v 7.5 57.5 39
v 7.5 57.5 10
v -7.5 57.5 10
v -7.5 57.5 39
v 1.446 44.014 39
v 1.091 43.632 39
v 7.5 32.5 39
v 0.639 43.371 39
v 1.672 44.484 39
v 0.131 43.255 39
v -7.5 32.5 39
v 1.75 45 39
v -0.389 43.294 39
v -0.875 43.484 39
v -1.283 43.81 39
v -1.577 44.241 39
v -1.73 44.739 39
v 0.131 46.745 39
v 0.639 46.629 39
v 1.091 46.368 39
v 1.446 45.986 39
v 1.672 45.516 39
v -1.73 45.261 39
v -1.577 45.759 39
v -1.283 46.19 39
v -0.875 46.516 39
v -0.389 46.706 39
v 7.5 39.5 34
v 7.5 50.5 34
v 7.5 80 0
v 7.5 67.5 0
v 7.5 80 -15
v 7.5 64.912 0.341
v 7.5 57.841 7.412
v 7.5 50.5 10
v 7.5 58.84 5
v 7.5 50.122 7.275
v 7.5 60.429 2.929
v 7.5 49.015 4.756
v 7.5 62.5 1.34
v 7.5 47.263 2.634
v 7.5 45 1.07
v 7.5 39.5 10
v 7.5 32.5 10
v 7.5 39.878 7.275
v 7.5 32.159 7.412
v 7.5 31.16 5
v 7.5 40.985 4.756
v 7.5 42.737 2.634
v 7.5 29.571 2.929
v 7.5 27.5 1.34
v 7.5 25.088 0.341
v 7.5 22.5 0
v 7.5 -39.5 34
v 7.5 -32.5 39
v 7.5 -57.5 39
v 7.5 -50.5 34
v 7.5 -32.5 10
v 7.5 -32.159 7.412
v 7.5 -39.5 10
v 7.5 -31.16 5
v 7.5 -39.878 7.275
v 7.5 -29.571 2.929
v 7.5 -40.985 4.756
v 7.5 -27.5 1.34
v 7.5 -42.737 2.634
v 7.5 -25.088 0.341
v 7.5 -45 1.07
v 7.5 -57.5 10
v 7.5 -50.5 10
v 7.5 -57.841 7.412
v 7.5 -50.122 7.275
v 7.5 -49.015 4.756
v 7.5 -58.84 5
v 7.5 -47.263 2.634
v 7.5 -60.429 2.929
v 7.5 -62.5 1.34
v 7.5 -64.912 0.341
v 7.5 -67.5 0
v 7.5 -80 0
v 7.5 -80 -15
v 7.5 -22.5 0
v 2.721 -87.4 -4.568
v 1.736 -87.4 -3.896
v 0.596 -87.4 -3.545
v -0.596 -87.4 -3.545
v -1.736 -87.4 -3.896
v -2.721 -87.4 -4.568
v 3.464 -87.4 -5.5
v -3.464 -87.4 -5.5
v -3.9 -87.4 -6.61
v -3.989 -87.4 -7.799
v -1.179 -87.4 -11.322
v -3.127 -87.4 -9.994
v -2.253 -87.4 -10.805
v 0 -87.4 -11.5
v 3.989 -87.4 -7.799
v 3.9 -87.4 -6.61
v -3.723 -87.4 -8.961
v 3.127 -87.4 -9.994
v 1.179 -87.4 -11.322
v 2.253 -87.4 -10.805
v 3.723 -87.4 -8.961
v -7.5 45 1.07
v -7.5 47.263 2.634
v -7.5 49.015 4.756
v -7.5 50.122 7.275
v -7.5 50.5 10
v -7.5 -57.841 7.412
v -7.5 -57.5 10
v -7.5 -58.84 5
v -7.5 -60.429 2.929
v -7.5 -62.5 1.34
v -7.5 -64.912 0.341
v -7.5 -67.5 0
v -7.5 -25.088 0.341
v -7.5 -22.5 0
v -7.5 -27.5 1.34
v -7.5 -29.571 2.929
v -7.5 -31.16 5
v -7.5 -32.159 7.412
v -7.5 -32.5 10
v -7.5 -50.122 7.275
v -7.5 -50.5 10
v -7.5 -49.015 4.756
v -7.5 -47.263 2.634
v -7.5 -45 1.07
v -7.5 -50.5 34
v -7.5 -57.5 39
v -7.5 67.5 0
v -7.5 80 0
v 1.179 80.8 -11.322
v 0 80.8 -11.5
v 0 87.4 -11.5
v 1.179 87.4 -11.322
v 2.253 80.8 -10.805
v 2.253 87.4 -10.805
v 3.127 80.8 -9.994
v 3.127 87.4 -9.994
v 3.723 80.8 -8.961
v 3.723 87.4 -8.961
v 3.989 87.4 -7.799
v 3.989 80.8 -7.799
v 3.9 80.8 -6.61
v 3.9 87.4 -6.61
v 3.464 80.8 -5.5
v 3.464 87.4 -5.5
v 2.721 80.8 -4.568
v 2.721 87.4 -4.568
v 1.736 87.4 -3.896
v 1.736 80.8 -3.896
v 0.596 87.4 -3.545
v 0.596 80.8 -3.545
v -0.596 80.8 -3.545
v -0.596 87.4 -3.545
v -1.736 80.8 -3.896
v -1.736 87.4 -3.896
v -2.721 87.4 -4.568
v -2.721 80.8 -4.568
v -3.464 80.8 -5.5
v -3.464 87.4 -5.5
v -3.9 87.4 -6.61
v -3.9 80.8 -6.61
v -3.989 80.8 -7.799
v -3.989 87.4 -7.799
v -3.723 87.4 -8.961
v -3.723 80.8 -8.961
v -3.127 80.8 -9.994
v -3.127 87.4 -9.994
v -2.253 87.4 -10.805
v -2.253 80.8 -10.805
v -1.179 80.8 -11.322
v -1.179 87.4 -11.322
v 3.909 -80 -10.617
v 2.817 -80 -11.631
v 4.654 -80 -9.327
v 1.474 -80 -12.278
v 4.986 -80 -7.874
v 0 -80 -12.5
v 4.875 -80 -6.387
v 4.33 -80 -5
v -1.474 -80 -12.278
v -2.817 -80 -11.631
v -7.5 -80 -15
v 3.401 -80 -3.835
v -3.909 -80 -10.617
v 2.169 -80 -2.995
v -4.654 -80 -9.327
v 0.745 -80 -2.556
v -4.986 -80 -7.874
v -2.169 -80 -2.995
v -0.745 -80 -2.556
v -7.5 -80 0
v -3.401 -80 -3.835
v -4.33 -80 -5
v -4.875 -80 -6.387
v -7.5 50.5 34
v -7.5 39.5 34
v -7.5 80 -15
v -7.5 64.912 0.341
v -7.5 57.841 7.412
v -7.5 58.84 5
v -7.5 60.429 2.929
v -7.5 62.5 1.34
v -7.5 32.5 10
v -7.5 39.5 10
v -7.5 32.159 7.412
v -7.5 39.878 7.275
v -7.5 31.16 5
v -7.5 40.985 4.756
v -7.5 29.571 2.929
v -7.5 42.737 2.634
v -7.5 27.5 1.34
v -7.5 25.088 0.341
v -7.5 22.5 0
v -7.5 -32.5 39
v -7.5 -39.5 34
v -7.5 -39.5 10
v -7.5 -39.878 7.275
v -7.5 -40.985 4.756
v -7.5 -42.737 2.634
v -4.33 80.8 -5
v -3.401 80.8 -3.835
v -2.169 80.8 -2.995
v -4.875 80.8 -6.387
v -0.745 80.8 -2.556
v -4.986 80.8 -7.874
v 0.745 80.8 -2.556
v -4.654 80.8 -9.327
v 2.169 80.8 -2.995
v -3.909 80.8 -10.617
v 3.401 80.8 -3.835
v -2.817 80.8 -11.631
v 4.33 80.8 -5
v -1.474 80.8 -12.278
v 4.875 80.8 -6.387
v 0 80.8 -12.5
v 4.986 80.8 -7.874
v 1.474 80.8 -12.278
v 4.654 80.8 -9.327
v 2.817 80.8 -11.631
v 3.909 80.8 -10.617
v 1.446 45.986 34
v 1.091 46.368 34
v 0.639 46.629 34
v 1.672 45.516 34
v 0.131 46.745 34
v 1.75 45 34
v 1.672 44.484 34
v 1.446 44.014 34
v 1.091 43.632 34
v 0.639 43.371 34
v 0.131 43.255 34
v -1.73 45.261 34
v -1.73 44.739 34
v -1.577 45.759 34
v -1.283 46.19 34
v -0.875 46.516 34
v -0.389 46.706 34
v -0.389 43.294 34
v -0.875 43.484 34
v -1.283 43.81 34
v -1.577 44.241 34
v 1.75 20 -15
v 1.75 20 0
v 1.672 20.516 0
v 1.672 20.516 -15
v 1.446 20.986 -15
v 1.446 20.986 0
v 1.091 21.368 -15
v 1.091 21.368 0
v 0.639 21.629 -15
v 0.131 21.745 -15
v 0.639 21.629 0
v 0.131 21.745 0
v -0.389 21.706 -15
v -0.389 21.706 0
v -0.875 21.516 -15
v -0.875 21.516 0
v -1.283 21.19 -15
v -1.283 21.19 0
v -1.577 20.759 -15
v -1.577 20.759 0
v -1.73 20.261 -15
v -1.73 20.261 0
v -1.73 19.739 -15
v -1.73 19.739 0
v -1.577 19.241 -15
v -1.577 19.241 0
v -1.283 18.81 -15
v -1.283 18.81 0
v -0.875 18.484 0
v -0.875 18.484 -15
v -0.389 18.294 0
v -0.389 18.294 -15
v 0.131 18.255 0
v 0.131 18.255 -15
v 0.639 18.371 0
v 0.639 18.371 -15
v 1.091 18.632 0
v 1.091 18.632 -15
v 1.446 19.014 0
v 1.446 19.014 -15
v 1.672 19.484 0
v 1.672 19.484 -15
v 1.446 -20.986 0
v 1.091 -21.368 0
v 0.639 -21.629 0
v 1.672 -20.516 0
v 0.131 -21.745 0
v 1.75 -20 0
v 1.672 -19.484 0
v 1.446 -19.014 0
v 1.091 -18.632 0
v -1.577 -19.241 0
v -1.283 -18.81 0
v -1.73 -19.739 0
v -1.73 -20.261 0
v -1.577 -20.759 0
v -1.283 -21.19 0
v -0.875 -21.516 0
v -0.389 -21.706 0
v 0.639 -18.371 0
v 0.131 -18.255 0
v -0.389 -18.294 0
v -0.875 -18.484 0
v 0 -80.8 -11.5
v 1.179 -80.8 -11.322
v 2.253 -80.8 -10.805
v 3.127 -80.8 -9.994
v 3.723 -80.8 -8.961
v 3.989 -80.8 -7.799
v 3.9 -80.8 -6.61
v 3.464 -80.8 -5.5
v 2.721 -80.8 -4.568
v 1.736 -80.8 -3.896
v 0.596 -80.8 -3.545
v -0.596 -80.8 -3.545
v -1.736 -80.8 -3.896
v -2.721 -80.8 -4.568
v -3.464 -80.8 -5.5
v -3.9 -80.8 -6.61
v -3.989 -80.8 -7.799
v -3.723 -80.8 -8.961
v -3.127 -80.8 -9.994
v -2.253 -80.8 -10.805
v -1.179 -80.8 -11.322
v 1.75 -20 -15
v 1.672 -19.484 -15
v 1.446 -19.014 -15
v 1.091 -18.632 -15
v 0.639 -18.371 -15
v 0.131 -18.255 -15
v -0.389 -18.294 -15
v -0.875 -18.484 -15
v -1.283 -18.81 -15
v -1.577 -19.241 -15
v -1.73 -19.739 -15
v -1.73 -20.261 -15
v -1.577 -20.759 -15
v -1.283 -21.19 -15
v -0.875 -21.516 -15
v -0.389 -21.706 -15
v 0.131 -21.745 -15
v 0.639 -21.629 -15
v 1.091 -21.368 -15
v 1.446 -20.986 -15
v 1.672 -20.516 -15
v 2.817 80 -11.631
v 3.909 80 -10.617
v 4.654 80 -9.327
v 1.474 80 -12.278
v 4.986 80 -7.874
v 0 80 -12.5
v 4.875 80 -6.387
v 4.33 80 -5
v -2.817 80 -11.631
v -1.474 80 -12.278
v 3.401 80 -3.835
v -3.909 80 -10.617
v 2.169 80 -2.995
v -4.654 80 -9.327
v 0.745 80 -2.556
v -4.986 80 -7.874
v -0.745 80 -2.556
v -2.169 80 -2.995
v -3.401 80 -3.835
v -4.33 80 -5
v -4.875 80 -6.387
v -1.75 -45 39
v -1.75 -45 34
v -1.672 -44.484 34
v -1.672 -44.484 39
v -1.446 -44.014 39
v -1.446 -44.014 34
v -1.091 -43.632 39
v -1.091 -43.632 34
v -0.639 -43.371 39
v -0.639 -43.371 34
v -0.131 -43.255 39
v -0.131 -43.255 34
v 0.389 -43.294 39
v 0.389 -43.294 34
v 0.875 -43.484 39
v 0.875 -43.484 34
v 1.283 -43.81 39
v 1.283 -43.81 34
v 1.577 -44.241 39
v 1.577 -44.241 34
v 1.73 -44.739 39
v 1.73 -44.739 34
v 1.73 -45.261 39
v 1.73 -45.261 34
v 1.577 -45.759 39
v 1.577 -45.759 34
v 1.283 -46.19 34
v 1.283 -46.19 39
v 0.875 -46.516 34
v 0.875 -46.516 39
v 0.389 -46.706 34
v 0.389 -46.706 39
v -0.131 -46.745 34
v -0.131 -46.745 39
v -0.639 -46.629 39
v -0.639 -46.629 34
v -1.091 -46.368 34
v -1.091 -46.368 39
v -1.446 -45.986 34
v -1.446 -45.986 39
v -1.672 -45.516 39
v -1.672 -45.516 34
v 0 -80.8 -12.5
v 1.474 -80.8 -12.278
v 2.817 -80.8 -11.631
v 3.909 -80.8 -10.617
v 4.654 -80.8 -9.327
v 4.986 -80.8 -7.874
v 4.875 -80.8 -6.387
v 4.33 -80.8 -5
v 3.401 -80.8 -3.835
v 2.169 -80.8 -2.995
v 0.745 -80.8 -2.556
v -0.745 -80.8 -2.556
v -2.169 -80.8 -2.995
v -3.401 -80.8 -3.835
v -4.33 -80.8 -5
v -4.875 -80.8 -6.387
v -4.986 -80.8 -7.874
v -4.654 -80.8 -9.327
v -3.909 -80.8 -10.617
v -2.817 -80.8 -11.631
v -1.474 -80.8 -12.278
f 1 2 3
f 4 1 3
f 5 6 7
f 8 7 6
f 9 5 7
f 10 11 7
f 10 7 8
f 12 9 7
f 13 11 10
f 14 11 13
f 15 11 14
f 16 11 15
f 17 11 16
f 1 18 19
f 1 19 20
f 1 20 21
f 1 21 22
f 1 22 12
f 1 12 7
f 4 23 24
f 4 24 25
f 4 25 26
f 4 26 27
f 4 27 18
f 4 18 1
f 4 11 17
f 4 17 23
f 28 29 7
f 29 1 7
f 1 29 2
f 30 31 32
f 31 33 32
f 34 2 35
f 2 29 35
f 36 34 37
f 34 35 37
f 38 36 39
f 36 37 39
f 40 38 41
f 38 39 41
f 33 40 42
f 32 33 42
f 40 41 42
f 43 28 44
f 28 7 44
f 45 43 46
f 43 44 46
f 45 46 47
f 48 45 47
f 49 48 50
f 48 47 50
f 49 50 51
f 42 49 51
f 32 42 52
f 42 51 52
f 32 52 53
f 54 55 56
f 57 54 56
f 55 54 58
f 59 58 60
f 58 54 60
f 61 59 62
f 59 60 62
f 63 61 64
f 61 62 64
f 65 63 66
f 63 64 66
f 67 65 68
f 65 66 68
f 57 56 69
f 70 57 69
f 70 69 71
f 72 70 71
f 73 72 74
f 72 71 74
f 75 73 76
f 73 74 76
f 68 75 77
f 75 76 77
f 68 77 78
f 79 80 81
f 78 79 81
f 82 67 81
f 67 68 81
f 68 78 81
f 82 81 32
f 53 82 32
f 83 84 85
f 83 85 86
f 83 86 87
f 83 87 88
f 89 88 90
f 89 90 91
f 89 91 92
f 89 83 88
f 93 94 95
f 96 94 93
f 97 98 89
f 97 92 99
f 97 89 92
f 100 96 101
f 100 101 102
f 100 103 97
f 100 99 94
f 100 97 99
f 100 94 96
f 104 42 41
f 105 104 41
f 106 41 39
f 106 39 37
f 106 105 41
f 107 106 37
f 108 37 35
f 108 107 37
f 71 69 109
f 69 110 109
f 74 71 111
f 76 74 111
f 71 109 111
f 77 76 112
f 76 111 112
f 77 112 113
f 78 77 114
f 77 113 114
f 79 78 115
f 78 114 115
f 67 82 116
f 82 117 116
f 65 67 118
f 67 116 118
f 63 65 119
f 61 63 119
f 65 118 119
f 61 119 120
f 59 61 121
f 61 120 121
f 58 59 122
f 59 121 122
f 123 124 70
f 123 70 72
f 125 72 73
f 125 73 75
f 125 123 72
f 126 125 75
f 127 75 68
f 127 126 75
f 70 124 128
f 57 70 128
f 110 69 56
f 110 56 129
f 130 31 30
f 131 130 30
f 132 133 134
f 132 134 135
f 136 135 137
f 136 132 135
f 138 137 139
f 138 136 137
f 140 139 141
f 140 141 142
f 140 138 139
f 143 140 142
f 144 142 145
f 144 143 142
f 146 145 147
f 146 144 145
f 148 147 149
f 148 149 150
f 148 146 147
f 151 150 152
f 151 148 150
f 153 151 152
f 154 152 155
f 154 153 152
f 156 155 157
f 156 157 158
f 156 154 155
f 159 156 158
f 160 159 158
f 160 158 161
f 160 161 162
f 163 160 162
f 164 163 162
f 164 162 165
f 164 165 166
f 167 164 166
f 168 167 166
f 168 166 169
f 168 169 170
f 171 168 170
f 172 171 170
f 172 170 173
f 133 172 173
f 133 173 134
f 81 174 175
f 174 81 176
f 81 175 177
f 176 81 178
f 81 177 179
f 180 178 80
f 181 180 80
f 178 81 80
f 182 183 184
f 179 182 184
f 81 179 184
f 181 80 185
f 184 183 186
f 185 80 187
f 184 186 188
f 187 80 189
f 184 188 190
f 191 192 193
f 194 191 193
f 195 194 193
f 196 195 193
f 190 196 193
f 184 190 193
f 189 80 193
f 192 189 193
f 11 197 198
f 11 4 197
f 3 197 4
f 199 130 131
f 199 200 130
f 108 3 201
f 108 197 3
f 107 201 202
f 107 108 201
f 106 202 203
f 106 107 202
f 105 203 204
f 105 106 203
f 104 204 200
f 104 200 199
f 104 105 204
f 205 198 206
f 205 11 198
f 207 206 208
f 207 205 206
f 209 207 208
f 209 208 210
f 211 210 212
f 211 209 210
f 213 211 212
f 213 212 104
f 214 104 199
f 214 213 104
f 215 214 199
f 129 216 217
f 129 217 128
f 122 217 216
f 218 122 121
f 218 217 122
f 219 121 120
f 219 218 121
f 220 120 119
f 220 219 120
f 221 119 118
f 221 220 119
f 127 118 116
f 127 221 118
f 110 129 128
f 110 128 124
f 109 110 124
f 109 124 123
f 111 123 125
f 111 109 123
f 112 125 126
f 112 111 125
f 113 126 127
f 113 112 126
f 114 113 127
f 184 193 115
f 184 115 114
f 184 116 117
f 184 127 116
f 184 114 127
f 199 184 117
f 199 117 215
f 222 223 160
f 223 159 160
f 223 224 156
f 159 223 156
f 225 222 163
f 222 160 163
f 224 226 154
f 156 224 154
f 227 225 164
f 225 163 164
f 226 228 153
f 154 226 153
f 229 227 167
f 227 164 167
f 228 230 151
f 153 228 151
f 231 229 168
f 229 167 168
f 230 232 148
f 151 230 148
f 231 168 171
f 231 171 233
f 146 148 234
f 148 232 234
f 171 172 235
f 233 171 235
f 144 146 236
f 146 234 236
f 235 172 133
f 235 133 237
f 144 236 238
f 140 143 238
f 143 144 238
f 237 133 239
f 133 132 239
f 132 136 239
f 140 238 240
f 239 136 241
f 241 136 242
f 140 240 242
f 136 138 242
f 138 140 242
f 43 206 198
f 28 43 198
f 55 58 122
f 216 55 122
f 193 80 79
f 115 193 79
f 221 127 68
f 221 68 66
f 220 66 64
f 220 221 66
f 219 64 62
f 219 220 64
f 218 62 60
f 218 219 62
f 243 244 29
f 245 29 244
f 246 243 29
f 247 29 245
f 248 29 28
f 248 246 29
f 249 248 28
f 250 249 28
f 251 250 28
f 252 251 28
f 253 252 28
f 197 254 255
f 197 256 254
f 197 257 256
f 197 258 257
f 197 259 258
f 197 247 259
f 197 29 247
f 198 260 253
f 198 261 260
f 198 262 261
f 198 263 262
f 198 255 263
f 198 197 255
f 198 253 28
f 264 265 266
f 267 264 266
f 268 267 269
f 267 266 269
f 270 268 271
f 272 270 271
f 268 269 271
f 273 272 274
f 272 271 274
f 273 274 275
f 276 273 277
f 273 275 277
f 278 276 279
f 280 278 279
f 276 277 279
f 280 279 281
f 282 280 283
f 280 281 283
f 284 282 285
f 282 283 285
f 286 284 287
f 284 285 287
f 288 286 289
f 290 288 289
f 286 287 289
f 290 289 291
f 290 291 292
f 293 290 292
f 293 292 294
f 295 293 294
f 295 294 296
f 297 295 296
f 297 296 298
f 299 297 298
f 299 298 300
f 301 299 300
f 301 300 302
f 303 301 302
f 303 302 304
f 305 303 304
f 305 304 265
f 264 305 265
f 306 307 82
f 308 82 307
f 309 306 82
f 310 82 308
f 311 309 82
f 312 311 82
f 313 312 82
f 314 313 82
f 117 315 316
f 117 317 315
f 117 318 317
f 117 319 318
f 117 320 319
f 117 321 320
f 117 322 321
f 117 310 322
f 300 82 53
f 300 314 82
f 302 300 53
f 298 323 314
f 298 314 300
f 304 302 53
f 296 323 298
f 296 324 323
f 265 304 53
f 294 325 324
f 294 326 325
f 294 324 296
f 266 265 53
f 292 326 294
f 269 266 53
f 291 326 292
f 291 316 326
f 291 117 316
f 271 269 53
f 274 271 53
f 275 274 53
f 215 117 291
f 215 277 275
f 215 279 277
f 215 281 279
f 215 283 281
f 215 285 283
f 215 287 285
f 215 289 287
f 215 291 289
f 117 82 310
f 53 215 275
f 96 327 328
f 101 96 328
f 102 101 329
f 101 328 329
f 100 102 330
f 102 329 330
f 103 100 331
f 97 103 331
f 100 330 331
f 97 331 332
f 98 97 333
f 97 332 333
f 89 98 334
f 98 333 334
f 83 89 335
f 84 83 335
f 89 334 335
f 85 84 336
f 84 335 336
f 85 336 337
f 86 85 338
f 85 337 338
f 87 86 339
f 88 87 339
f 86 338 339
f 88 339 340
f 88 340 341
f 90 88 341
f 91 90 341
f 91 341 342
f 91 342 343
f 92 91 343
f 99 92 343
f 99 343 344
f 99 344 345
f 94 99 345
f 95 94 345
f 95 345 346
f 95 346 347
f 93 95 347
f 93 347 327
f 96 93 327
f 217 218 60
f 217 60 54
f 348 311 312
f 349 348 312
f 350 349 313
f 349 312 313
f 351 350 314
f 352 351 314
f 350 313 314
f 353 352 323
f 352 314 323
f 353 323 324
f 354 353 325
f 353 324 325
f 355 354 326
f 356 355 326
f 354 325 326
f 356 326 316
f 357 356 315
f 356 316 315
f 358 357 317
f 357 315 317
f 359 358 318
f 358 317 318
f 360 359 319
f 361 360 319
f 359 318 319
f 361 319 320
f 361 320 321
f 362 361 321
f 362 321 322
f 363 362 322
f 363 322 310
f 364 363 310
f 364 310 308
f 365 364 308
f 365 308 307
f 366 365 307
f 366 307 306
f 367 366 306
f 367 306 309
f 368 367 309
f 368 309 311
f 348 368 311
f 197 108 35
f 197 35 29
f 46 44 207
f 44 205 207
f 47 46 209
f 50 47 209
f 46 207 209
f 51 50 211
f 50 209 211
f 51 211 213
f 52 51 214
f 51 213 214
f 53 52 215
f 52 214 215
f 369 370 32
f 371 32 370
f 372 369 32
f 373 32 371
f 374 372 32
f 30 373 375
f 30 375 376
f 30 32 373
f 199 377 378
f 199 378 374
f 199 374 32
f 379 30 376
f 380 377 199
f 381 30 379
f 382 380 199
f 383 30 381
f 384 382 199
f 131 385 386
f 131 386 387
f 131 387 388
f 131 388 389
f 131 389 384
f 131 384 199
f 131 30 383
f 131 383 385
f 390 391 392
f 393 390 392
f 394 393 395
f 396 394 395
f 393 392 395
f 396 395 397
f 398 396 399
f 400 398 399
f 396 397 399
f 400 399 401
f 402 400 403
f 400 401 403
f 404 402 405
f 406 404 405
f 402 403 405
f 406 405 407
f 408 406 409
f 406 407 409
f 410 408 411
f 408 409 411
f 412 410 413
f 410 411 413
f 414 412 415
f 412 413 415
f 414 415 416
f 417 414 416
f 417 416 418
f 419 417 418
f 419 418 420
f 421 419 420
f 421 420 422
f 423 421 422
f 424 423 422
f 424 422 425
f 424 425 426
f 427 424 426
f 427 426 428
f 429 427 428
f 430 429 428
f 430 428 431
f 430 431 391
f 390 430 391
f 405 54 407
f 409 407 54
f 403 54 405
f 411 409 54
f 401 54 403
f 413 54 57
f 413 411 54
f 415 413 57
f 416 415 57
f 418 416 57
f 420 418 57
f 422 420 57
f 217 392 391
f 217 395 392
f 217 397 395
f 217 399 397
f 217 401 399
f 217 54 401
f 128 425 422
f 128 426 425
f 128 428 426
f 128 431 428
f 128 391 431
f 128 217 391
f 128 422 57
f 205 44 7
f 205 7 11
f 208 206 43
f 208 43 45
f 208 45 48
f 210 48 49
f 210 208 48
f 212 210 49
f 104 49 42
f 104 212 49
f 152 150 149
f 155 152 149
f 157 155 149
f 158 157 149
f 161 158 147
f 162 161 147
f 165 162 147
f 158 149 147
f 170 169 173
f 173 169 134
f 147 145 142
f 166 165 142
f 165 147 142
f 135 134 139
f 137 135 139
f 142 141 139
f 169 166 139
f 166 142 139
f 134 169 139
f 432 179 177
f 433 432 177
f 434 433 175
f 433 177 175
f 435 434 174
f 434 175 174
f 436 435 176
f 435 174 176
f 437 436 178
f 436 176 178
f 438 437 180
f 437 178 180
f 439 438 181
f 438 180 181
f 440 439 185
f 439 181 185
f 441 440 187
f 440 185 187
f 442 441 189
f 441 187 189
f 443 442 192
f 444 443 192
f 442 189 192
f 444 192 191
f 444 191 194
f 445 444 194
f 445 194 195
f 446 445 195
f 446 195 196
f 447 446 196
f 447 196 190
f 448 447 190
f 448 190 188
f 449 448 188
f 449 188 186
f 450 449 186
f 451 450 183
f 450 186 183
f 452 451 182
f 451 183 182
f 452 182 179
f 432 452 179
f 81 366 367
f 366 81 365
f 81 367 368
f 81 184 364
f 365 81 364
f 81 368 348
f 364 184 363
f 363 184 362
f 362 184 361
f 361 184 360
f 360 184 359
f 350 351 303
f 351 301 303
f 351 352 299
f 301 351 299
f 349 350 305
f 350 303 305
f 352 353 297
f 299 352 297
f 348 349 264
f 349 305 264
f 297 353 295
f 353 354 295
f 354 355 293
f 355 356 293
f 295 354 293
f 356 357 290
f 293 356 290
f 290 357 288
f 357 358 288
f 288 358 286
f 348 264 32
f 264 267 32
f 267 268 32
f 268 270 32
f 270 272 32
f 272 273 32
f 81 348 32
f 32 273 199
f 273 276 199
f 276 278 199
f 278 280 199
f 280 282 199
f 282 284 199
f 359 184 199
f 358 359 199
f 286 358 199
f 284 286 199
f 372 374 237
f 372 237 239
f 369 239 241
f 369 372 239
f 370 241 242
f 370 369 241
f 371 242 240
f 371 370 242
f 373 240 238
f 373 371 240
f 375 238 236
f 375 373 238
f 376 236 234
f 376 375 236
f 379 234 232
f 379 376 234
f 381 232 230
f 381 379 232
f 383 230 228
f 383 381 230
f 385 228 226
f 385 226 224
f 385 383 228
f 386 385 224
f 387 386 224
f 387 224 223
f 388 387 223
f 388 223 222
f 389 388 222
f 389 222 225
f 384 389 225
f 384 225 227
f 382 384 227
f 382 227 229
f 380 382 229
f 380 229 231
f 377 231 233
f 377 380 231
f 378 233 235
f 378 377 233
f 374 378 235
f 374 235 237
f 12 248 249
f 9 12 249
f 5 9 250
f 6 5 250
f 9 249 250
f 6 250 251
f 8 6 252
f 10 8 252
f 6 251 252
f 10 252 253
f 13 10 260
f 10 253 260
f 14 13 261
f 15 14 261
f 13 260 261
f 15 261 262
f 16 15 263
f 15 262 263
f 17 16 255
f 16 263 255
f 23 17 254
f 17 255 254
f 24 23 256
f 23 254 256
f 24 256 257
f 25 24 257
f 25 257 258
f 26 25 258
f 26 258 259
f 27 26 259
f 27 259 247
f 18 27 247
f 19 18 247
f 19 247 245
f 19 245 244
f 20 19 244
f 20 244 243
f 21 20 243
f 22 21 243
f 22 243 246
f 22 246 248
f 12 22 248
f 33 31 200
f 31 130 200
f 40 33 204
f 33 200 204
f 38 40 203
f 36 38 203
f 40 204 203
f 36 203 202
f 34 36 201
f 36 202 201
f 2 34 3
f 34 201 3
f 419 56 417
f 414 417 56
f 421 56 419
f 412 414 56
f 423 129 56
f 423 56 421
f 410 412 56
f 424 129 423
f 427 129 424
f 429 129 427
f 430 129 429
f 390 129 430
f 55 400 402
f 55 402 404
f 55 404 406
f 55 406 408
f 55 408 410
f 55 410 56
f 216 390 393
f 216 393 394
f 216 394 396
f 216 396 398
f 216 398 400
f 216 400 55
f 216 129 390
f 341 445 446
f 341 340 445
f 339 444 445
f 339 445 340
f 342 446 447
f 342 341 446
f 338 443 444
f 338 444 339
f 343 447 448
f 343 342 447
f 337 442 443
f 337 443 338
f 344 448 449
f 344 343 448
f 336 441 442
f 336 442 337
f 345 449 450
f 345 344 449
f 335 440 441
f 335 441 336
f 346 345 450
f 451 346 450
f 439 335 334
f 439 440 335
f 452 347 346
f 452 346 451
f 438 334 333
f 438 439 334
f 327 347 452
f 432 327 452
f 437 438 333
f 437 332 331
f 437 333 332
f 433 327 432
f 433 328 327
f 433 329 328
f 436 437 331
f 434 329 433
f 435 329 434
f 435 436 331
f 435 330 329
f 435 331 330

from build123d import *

# Parameters (mm, degrees)
ESQUISSE1_W                      = 25
ESQUISSE1_H                      = 15
BOSS_EXTRU_1_DEPTH               = 39
BOSS_EXTRU_1_2_DEPTH             = 39
ESQUISSE3_W                      = 160
ESQUISSE3_H                      = 15
BOSS_EXTRU_2_DEPTH               = 15
ESQUISSE4_R                      = 5
ESQUISSE4_R_2                    = 4
BOSS_EXTRU_5_DEPTH               = 0.8
ESQUISSE4_6_R                    = 4
BOSS_EXTRU_6_DEPTH               = 7.4
CONG_1_R                         = 10
ESQUISSE5_W                      = 11
ESQUISSE5_H                      = 34
ENL_V_MAT_EXTRU_1_DEPTH          = 97.874970968
CONG_2_R                         = 10
ESQUISSE6_R                      = 1.75
ENL_V_MAT_EXTRU_2_DEPTH          = 101.478903258
ESQUISSE11_R                     = 1.75
TROUS_VIS_SUPPORT_CAPTEURS_DEPTH = 97.000052083


with BuildPart() as part:
    # Esquisse1 → Boss.-Extru.1 (new body)
    with BuildSketch(Plane(origin=(0, 0, 0), x_dir=(0, 1, 0), z_dir=(0, 0, 1))):
        with Locations((-45, 0)):
            Rectangle(ESQUISSE1_W, ESQUISSE1_H)
    extrude(amount=BOSS_EXTRU_1_DEPTH)



with BuildPart() as body_2:
    # Esquisse1 → Boss.-Extru.1 2 (new body)
    with BuildSketch(Plane(origin=(0, 0, 0), x_dir=(0, 1, 0), z_dir=(0, 0, 1))):
        with Locations((45, 0)):
            Rectangle(ESQUISSE1_W, ESQUISSE1_H)
    extrude(amount=BOSS_EXTRU_1_2_DEPTH)


with BuildPart() as part_1:
    add(part.part)

    add(body_2.part)  # Boss.-Extru.2 merges body 2
    # Esquisse3 → Boss.-Extru.2 (add)
    with BuildSketch(Plane(origin=(0, 0, 0), x_dir=(0, 1, 0), z_dir=(0, 0, 1))):
        Rectangle(ESQUISSE3_W, ESQUISSE3_H)
    extrude(amount=-BOSS_EXTRU_2_DEPTH)

    # Esquisse4 → Boss.-Extru.5 (add)
    with BuildSketch(Plane(origin=(0, -80, 0), x_dir=(-1, 0, 0), z_dir=(0, -1, 0))):
        with Locations(Location((0, 7.5, 0), (0, 0, 90))):
            Circle(ESQUISSE4_R)
        with Locations(Location((0, 7.5, 0), (0, 0, 90))):
            Circle(ESQUISSE4_R_2, mode=Mode.SUBTRACT)
    boss_extru_5 = extrude(amount=BOSS_EXTRU_5_DEPTH)

    # Esquisse4<6> → Boss.-Extru.6 (add)
    with BuildSketch(Plane(origin=(0, -80, 0), x_dir=(-1, 0, 0), z_dir=(0, -1, 0))):
        with Locations(Location((0, 7.5, 0), (0, 0, 90))):
            Circle(ESQUISSE4_6_R)
    boss_extru_6 = extrude(amount=BOSS_EXTRU_6_DEPTH)

    # Symétrie2: Boss.-Extru.5, Boss.-Extru.6 across plane
    add(boss_extru_5.mirror(Plane.ZX))
    add(boss_extru_6.mirror(Plane.ZX))

    # Congé1
    cong_1_edges = [part_1.edges().sort_by_distance(p)[0] for p in [
        (0, 57.5, 0),
        (0, 32.5, 0),
        (0, -57.5, 0),
        (0, -32.5, 0),
    ]]
    fillet(cong_1_edges, radius=CONG_1_R)

    # Esquisse5 → Enlèv. mat.-Extru.1 (cut, through all)
    with BuildSketch(Plane(origin=(-7.5, 0, 0), x_dir=(0, -1, 0), z_dir=(-1, 0, 0))):
        with Locations((45, 17)):
            Rectangle(ESQUISSE5_W, ESQUISSE5_H)
        with Locations((-45, 17)):
            Rectangle(ESQUISSE5_W, ESQUISSE5_H)
    extrude(amount=-ENL_V_MAT_EXTRU_1_DEPTH, mode=Mode.SUBTRACT)

    # Congé2
    # the kernel refuses this fillet: 10 mm, written as the material it adds along each edge
    with BuildSketch(Plane(origin=(-7.5, 39.5, 0), x_dir=(0, 0, 1), z_dir=(1, 0, 0)), Plane(origin=(-7.5, -39.5, 0), x_dir=(0, -1, 0), z_dir=(1, 0, 0)), Plane(origin=(-7.5, -50.5, 0), x_dir=(0, 0, 1), z_dir=(1, 0, 0))) as cong_2_piece_1:
        with BuildLine():
            CenterArc((CONG_2_R, -CONG_2_R), CONG_2_R, 90, 90)
            Line((0, -CONG_2_R), (0, 0))
            Line((0, 0), (CONG_2_R, 0))
        make_face()
    extrude(amount=15)
    with BuildSketch(Plane(origin=(-7.5, 50.5, 0), x_dir=(0, 0, 1), z_dir=(1, 0, 0))) as cong_2_piece_2:
        with BuildLine():
            CenterArc((CONG_2_R, CONG_2_R), CONG_2_R, 180, 90)
            Line((0, CONG_2_R), (0, 0))
            Line((0, 0), (CONG_2_R, 0))
        make_face()
    extrude(amount=15)

    # Esquisse6 → Enlèv. mat.-Extru.2 (cut, through all)
    with BuildSketch(Plane(origin=(0, 0, 34), x_dir=(1, 0, 0), z_dir=(0, 0, -1))):
        with Locations(Location((0, 45, 0), (0, 0, 180))):
            Circle(ESQUISSE6_R)
        with Locations((0, -45)):
            Circle(ESQUISSE6_R)
    extrude(amount=-ENL_V_MAT_EXTRU_2_DEPTH, mode=Mode.SUBTRACT)

    # Esquisse11 → Trous vis support capteurs (cut, through all)
    with BuildSketch(Plane(origin=(0, 0, 0), x_dir=(0, 1, 0), z_dir=(0, 0, 1))):
        with Locations(Location((20, 0, 0), (0, 0, 270))):
            Circle(ESQUISSE11_R)
        with Locations(Location((-20, 0, 0), (0, 0, 270))):
            Circle(ESQUISSE11_R)
    extrude(amount=-TROUS_VIS_SUPPORT_CAPTEURS_DEPTH, mode=Mode.SUBTRACT)


solid = part_1.part
